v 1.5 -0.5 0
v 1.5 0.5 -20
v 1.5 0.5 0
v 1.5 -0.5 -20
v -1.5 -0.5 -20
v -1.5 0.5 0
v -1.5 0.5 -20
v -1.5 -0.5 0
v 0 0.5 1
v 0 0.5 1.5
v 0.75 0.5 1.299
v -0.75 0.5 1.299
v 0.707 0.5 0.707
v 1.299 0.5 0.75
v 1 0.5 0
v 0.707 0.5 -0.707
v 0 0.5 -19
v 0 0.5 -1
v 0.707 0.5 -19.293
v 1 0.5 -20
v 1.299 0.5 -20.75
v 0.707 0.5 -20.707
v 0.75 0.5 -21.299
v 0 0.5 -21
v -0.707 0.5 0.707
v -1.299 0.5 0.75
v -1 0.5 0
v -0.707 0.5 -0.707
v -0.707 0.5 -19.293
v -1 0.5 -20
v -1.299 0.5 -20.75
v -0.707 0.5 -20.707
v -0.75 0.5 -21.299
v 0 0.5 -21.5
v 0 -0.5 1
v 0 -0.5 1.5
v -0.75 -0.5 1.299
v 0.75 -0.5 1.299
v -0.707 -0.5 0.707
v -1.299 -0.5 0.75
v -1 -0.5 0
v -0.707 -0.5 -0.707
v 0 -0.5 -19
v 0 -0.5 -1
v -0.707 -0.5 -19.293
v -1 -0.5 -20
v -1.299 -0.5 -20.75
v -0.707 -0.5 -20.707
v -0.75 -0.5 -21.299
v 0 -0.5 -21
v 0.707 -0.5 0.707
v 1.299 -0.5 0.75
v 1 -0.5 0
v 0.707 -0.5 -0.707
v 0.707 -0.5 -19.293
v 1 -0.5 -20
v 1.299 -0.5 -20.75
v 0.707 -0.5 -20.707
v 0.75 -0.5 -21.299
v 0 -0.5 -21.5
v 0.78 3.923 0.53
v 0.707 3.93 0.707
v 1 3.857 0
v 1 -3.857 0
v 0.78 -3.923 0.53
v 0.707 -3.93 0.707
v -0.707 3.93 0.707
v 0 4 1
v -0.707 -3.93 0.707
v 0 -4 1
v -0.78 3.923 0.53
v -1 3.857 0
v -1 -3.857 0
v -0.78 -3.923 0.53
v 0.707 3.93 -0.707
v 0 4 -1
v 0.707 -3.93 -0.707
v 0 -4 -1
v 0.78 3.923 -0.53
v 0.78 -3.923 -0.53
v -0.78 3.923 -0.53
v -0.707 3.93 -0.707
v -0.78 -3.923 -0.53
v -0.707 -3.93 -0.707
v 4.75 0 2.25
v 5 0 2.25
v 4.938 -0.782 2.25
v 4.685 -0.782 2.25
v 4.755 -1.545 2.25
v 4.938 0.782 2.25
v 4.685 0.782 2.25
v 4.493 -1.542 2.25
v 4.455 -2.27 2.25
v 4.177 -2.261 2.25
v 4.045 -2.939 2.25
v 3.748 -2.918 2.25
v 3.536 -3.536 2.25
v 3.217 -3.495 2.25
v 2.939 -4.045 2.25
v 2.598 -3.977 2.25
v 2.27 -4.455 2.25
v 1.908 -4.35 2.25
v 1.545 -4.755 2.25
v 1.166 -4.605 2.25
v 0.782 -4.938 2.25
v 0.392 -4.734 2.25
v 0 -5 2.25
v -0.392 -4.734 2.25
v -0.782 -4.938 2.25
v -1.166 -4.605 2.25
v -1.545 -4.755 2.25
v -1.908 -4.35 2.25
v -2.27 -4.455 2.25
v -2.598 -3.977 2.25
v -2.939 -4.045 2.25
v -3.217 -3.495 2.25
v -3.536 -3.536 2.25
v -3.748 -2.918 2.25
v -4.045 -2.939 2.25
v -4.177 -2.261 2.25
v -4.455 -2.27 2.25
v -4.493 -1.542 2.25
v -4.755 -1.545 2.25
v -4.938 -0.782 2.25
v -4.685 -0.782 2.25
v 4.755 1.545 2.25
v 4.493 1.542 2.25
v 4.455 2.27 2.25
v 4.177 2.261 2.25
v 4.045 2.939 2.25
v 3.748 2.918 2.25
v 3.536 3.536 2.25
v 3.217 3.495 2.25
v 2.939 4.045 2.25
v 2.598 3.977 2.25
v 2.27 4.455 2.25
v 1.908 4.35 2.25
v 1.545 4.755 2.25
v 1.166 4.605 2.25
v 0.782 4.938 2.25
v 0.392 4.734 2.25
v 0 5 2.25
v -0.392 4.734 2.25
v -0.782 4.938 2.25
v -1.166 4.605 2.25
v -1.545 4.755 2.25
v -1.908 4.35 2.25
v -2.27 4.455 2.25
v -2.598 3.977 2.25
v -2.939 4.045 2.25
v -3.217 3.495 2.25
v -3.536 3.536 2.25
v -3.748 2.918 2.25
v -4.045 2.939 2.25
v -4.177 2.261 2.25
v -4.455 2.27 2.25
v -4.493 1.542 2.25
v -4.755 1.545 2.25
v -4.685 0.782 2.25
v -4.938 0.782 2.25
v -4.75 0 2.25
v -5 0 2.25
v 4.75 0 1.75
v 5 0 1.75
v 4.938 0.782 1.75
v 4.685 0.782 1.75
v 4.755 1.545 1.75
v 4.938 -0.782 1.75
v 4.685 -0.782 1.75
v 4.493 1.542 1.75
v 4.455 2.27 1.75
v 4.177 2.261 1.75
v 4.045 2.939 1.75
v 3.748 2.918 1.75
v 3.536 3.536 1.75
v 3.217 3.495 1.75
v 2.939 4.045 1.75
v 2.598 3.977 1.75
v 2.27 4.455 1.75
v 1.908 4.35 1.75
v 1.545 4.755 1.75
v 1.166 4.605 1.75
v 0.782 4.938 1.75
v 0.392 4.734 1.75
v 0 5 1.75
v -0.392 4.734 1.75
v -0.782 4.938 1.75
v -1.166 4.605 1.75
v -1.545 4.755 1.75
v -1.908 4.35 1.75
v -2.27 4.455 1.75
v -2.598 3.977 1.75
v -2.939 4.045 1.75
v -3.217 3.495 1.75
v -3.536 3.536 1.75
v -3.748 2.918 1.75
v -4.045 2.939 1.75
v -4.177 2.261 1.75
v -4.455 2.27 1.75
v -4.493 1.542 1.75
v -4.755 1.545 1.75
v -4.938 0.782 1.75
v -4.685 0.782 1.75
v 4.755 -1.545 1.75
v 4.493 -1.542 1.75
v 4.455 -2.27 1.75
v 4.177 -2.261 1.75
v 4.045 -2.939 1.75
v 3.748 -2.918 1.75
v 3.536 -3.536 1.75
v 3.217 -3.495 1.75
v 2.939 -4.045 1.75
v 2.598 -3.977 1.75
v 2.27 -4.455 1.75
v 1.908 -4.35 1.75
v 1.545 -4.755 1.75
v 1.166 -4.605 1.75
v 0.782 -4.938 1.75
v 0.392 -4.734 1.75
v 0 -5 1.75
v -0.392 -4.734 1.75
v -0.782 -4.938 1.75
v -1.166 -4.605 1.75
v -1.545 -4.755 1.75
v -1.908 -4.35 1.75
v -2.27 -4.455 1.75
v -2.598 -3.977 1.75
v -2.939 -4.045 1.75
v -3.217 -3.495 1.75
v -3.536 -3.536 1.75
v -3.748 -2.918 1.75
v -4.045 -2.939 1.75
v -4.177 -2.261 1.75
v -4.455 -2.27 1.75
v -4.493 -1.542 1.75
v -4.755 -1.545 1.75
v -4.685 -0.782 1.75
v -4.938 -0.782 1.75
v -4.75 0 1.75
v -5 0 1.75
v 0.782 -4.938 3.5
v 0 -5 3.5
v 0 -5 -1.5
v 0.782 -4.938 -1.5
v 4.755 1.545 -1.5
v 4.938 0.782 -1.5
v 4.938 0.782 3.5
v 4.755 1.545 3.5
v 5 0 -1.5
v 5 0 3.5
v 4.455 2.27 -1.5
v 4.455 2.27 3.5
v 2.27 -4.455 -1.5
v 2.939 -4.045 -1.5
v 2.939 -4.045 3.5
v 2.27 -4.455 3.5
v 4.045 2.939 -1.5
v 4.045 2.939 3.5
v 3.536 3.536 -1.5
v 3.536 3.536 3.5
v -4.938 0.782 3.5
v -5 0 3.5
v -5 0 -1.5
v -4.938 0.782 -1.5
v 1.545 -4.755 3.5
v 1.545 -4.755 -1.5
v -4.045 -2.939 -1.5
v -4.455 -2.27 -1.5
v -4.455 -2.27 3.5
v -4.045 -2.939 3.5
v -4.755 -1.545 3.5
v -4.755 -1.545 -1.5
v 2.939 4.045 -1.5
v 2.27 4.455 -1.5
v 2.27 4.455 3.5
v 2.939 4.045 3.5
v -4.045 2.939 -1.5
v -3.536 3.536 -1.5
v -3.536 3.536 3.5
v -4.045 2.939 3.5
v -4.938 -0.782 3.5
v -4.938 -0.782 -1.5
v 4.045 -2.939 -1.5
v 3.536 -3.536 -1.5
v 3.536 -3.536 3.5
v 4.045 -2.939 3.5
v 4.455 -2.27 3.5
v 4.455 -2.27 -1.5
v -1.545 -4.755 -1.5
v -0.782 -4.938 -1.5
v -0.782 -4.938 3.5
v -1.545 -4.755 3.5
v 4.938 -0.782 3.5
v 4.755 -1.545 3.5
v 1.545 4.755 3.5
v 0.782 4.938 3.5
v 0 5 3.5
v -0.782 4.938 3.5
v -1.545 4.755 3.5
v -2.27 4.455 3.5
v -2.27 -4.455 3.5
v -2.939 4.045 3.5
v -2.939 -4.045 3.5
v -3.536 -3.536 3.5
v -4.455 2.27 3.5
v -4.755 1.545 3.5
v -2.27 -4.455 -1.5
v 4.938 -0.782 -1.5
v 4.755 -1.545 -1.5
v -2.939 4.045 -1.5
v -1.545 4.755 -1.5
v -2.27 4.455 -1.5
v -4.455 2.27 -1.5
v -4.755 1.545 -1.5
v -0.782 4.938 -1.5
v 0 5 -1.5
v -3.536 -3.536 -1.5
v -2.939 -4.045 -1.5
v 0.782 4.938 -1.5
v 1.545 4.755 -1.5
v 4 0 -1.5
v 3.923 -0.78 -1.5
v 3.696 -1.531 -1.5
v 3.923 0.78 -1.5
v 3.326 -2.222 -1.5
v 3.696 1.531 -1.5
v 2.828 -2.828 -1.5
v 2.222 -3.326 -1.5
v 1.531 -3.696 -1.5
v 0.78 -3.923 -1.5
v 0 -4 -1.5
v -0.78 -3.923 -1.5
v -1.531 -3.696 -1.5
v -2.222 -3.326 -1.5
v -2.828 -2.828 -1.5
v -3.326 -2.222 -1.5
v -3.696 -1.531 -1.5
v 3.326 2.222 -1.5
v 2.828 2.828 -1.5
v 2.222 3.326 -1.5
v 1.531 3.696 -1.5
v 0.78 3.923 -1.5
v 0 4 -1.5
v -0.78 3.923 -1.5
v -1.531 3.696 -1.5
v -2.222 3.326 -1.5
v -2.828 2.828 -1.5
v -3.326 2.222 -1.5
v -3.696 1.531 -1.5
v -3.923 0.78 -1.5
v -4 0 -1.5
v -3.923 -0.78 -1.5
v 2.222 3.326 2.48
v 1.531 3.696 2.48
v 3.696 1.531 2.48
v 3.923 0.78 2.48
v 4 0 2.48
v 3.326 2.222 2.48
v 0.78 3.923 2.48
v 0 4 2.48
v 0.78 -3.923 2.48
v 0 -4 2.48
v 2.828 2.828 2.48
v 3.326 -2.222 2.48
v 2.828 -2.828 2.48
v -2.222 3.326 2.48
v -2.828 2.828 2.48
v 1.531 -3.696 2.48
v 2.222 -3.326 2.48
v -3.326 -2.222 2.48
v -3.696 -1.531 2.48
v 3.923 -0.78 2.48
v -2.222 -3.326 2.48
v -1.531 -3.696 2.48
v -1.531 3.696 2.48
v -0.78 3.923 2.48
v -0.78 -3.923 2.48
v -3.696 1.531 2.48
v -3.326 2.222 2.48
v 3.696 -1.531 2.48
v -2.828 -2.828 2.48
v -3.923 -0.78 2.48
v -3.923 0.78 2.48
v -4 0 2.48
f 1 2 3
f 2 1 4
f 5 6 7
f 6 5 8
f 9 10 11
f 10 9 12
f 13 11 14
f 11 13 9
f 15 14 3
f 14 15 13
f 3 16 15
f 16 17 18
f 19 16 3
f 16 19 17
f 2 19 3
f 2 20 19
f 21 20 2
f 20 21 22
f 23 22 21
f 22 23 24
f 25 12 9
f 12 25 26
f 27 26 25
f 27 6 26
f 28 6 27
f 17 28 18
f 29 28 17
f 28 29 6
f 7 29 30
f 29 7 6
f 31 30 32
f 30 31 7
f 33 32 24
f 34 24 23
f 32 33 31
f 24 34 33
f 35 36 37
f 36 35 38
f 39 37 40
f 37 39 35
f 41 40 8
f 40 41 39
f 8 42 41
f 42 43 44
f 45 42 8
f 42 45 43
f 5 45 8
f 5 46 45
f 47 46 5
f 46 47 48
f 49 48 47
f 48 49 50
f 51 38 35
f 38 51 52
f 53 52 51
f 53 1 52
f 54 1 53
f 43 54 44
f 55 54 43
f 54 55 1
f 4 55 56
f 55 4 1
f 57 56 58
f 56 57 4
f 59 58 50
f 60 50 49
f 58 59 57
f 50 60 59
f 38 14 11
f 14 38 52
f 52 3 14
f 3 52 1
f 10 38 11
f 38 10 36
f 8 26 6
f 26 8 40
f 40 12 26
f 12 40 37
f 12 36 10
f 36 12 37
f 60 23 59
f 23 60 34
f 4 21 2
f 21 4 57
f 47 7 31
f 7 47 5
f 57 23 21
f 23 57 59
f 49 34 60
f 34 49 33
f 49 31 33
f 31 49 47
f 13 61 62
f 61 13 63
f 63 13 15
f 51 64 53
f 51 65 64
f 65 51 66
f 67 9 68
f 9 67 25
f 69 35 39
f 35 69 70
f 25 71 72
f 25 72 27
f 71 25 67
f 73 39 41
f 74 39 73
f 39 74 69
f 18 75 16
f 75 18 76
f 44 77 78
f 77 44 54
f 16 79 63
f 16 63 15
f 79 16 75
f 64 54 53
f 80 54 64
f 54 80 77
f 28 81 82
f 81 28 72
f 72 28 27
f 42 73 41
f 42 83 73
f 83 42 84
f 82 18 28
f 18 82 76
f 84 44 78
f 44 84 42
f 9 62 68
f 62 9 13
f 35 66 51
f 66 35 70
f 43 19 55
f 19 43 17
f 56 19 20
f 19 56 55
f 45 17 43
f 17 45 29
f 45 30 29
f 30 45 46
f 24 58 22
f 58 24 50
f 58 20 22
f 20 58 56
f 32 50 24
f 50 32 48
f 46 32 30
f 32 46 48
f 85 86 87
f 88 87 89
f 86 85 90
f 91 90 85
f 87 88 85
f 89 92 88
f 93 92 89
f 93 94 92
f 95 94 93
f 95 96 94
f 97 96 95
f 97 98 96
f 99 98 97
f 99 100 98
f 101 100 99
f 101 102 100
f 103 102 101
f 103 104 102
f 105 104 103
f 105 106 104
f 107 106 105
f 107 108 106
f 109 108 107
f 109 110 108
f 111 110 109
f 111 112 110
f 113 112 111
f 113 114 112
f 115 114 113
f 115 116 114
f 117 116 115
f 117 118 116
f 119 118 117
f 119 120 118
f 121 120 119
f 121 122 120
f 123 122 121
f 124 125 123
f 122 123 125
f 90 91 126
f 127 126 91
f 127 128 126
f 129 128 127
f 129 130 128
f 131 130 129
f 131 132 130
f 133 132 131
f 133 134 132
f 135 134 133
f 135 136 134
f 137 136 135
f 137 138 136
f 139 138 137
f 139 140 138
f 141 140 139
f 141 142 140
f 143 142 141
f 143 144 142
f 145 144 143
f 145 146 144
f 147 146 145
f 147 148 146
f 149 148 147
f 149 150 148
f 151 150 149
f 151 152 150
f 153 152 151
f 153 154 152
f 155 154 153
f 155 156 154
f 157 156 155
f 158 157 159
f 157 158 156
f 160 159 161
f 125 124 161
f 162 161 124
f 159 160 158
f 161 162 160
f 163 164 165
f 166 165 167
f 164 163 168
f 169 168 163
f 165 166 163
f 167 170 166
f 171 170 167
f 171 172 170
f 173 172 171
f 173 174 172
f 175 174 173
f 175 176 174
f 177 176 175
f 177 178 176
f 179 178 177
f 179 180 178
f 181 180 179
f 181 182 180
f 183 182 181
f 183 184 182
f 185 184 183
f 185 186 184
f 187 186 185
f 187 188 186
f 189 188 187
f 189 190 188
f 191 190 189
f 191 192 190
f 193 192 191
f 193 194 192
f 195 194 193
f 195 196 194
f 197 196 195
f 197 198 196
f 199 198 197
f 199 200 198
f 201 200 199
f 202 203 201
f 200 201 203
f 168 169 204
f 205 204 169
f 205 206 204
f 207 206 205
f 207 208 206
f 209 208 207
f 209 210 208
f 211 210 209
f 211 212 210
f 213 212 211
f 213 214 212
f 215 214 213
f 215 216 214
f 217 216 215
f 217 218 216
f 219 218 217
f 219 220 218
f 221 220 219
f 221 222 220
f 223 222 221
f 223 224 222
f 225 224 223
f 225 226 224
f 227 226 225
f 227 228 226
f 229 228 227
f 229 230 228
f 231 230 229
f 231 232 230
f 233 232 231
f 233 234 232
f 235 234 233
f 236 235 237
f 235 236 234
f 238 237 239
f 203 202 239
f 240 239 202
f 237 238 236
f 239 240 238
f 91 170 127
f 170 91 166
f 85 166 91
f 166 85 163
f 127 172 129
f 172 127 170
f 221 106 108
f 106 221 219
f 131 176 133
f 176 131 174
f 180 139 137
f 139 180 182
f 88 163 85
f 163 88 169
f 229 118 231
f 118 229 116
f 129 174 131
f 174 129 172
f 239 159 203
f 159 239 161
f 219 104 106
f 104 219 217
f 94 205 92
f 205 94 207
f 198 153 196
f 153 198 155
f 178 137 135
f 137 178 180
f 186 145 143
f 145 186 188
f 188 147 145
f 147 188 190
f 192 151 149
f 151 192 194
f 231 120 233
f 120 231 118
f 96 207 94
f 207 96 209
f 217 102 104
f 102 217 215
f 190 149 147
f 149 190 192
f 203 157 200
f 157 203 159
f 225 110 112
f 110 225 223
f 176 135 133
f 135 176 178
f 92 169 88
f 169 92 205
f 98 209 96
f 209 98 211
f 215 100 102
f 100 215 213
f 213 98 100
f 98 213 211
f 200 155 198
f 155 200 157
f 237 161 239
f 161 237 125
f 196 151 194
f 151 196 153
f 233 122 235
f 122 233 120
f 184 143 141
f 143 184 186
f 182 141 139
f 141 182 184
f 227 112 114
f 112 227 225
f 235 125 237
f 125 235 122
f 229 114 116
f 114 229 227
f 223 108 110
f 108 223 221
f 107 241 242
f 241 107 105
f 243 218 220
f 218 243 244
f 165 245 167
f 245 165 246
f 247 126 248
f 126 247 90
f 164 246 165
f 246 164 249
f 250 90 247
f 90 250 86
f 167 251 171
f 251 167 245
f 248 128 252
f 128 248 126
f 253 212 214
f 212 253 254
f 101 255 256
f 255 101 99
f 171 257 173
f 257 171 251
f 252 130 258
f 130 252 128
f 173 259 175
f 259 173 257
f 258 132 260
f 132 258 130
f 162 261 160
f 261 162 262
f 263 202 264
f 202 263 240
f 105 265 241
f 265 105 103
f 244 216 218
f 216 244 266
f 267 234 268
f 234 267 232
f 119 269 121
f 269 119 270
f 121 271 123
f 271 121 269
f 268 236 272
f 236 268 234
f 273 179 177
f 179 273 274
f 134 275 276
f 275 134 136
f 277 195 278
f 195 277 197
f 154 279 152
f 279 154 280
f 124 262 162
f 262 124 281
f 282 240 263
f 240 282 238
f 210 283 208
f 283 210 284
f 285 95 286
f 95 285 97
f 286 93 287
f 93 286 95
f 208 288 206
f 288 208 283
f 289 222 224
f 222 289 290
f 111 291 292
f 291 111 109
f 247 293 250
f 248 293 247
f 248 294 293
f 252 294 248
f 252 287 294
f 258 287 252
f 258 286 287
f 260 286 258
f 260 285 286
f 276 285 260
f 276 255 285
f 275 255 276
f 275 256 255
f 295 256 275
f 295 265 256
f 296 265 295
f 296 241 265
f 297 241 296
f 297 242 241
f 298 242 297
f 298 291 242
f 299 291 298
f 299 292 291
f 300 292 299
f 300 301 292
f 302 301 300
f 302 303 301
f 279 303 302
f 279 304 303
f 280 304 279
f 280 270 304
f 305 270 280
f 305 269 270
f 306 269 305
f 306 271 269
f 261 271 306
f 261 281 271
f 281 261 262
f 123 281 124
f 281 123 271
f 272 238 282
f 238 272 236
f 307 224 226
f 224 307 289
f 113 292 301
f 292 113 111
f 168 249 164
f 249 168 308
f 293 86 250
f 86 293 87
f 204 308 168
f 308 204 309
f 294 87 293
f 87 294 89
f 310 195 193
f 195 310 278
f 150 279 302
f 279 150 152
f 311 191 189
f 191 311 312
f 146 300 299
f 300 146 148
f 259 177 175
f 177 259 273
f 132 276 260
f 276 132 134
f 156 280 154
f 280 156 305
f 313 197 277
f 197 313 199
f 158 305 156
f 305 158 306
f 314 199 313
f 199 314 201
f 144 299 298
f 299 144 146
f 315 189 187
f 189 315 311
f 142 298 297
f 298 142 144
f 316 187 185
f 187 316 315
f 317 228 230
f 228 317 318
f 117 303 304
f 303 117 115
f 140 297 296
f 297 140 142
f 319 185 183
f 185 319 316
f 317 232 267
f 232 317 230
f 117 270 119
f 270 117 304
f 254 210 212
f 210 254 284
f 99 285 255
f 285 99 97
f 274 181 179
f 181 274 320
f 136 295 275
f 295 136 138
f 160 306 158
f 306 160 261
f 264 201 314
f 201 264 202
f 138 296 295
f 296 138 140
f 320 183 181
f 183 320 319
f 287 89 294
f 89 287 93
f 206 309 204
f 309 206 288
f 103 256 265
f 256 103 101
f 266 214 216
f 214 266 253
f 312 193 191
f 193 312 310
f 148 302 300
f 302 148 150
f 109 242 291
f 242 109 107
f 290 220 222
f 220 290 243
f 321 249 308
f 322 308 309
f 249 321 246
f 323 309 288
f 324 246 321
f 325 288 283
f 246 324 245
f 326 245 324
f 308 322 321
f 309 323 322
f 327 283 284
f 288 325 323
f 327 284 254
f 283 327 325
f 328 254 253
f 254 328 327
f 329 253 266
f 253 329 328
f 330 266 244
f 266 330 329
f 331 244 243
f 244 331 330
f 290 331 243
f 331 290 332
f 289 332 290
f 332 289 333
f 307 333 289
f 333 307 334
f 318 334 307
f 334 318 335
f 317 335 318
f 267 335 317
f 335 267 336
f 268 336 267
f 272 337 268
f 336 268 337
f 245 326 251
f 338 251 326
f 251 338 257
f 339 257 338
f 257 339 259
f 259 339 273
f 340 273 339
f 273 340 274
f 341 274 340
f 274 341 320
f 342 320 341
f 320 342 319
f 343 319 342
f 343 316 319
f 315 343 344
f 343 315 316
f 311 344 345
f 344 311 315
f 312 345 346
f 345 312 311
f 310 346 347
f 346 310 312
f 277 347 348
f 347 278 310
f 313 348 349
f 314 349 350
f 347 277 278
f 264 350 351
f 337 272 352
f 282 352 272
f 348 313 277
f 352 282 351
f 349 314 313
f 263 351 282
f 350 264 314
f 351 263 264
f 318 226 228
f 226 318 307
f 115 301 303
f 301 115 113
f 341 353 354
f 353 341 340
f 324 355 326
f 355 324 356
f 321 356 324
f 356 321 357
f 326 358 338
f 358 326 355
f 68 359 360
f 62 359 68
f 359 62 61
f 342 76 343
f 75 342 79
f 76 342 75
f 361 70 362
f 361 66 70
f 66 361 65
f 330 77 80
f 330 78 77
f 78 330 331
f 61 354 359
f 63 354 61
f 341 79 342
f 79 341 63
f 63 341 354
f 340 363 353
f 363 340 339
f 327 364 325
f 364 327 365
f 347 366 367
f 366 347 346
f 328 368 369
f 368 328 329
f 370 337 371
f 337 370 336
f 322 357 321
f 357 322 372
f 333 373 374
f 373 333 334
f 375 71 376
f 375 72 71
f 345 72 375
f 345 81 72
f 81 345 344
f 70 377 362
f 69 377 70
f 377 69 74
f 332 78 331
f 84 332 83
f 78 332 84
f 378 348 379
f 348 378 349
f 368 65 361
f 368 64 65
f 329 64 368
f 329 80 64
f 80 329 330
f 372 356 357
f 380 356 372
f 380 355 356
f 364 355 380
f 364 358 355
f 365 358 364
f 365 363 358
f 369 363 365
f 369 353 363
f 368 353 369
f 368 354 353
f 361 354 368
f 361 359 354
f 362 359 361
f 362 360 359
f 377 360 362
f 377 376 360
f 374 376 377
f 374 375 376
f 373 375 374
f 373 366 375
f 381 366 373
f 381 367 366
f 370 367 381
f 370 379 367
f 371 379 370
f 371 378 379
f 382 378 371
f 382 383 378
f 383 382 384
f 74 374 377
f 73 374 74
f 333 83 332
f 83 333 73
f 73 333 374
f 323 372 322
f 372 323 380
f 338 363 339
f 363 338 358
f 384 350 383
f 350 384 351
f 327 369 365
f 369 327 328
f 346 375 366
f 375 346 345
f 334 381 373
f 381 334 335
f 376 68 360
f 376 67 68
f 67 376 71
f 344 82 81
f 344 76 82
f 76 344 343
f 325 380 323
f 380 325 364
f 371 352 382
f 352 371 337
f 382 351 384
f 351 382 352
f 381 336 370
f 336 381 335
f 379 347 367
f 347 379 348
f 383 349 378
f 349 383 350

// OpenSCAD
$fa=1;
$fs=0.8;

module crankshaft(num_stacks=1, staggered=false, cycle_percent=0) {
    piston();
}

PISTON_ROTATING_ELEMENT_RADIUS = 1;

PISTON_HEAD_RADIUS = 5;
PISTON_HEAD_HEIGHT = 5;
PISTON_HEAD_THICKNESS = 1;
PISTON_HEAD_ORING_TOP_OFFSET = 1.5;
PISTON_HEAD_ORING_RADIUS = 0.25;
PISTON_HEAD_HINGE_RADIUS = PISTON_ROTATING_ELEMENT_RADIUS;
PISTON_HEAD_HINGE_BOTTOM_OFFSET = 1.5;

PISTON_SHAFT_HOLE_DIST = 20;
PISTON_SHAFT_HOLE_RADIUS = PISTON_ROTATING_ELEMENT_RADIUS;
PISTON_SHAFT_WIDTH = 3;
PISTON_SHAFT_THICKNESS = 1;

module piston(swing_degree=0) {
    pshd = PISTON_SHAFT_HOLE_DIST;
    phhbo = PISTON_HEAD_HINGE_BOTTOM_OFFSET;
    
    piston_z_offset = PISTON_SHAFT_HOLE_DIST / 2;
    shaft_rotation = swing_degree;
    rotation_offset = pshd / 2;
    pistion_head_z_offset = pshd / 2 - phhbo;

    translate([0,0,-piston_z_offset]) {
        rotate_offset([0,shaft_rotation,0], [0,0,rotation_offset])
            piston_shaft();
        
        translate([0,0,pistion_head_z_offset])
            piston_head();
    }
}

module rotate_offset(degrees,offset) {
    offset_inv = [offset[0] * -1, offset[1] * -1, offset[2] * -1];
    
    translate(offset)
        rotate(degrees)
        translate(offset_inv)
        children(0);
} 

module piston_head() {
    piston_radius = PISTON_HEAD_RADIUS;
    piston_height = PISTON_HEAD_HEIGHT;
    
    difference() {
        cylinder(h=piston_height, r=piston_radius);
        piston_head_cavity();
        piston_head_oring_slot();
    }
    piston_head_hinge();
}

module piston_head_oring_slot() {
    oring_height = PISTON_HEAD_ORING_RADIUS * 2;
    oring_cut_offset = PISTON_HEAD_RADIUS + 0.001;
    oring_depth = PISTON_HEAD_RADIUS - PISTON_HEAD_ORING_RADIUS;
    oring_z_offset = PISTON_HEAD_HEIGHT - PISTON_HEAD_ORING_TOP_OFFSET;
    
    translate([0,0,oring_z_offset])
        ring(oring_height,oring_cut_offset,oring_depth, center=true);
}

module ring(h,outer_radius,inner_radius,center=false) {
    inner_cavity_offset = 0.0001;
    inner_cavity_h = h + (inner_cavity_offset * 2);
    
    difference() {
        cylinder(h=h,r=outer_radius, center=center);
        translate([0,0,-inner_cavity_offset])
            cylinder(h=inner_cavity_h,r=inner_radius,center=center);
    }
}

module piston_head_cavity() {
    phh = PISTON_HEAD_HEIGHT;
    pht = PISTON_HEAD_THICKNESS;
    phr = PISTON_HEAD_RADIUS;
    
    piston_cavity_z_offset = -0.01;
    
    piston_cavity_h = phh - pht + piston_cavity_z_offset;
    piston_cavity_r = phr - pht;
  
    translate([0,0,piston_cavity_z_offset])
        cylinder(h=piston_cavity_h, r=piston_cavity_r);
}

module piston_head_hinge() {
    phr = PISTON_HEAD_RADIUS;
    pht = PISTON_HEAD_THICKNESS;
    
    hinge_length = (phr * 2) - (pht / 2);
    hinge_r = PISTON_HEAD_HINGE_RADIUS;
    hinge_z_offset = PISTON_HEAD_HINGE_BOTTOM_OFFSET;
  
    translate([0,0,hinge_z_offset])
        rotate([90,0,0])
        cylinder(hinge_length, r=hinge_r, center=true);
}

module piston_shaft() {
    difference() {
        piston_shaft_body();
        piston_shaft_drill_holes();
    }
}

module piston_shaft_body() {
    piston_shaft_dimensions = [
        PISTON_SHAFT_WIDTH,
        PISTON_SHAFT_THICKNESS,
        PISTON_SHAFT_HOLE_DIST
    ];
    
    cube(piston_shaft_dimensions, center=true);
            
    round_end_offest = PISTON_SHAFT_HOLE_DIST / 2;
    round_end_radius = PISTON_SHAFT_WIDTH / 2;
    round_end_thickness = PISTON_SHAFT_THICKNESS;
    
    translate([0,0,round_end_offest])
        rotate([90,0,0])
        cylinder(h=round_end_thickness, r=round_end_radius, center=true);
    translate([0,0,-round_end_offest])
        rotate([90,0,0])
        cylinder(h=round_end_thickness, r=round_end_radius, center=true);
}

module piston_shaft_drill_holes() {
    peg_radius = PISTON_SHAFT_HOLE_RADIUS;
    peg_height = PISTON_SHAFT_THICKNESS + 1;
    peg_offset = PISTON_SHAFT_HOLE_DIST / 2;
    
    translate([0,0,peg_offset])
        rotate([90,0,0])
        cylinder(h=peg_height, r=peg_radius, center=true);
    translate([0,0,-peg_offset])
        rotate([90,0,0])
        cylinder(h=peg_height, r=peg_radius, center=true);
}


crankshaft();
